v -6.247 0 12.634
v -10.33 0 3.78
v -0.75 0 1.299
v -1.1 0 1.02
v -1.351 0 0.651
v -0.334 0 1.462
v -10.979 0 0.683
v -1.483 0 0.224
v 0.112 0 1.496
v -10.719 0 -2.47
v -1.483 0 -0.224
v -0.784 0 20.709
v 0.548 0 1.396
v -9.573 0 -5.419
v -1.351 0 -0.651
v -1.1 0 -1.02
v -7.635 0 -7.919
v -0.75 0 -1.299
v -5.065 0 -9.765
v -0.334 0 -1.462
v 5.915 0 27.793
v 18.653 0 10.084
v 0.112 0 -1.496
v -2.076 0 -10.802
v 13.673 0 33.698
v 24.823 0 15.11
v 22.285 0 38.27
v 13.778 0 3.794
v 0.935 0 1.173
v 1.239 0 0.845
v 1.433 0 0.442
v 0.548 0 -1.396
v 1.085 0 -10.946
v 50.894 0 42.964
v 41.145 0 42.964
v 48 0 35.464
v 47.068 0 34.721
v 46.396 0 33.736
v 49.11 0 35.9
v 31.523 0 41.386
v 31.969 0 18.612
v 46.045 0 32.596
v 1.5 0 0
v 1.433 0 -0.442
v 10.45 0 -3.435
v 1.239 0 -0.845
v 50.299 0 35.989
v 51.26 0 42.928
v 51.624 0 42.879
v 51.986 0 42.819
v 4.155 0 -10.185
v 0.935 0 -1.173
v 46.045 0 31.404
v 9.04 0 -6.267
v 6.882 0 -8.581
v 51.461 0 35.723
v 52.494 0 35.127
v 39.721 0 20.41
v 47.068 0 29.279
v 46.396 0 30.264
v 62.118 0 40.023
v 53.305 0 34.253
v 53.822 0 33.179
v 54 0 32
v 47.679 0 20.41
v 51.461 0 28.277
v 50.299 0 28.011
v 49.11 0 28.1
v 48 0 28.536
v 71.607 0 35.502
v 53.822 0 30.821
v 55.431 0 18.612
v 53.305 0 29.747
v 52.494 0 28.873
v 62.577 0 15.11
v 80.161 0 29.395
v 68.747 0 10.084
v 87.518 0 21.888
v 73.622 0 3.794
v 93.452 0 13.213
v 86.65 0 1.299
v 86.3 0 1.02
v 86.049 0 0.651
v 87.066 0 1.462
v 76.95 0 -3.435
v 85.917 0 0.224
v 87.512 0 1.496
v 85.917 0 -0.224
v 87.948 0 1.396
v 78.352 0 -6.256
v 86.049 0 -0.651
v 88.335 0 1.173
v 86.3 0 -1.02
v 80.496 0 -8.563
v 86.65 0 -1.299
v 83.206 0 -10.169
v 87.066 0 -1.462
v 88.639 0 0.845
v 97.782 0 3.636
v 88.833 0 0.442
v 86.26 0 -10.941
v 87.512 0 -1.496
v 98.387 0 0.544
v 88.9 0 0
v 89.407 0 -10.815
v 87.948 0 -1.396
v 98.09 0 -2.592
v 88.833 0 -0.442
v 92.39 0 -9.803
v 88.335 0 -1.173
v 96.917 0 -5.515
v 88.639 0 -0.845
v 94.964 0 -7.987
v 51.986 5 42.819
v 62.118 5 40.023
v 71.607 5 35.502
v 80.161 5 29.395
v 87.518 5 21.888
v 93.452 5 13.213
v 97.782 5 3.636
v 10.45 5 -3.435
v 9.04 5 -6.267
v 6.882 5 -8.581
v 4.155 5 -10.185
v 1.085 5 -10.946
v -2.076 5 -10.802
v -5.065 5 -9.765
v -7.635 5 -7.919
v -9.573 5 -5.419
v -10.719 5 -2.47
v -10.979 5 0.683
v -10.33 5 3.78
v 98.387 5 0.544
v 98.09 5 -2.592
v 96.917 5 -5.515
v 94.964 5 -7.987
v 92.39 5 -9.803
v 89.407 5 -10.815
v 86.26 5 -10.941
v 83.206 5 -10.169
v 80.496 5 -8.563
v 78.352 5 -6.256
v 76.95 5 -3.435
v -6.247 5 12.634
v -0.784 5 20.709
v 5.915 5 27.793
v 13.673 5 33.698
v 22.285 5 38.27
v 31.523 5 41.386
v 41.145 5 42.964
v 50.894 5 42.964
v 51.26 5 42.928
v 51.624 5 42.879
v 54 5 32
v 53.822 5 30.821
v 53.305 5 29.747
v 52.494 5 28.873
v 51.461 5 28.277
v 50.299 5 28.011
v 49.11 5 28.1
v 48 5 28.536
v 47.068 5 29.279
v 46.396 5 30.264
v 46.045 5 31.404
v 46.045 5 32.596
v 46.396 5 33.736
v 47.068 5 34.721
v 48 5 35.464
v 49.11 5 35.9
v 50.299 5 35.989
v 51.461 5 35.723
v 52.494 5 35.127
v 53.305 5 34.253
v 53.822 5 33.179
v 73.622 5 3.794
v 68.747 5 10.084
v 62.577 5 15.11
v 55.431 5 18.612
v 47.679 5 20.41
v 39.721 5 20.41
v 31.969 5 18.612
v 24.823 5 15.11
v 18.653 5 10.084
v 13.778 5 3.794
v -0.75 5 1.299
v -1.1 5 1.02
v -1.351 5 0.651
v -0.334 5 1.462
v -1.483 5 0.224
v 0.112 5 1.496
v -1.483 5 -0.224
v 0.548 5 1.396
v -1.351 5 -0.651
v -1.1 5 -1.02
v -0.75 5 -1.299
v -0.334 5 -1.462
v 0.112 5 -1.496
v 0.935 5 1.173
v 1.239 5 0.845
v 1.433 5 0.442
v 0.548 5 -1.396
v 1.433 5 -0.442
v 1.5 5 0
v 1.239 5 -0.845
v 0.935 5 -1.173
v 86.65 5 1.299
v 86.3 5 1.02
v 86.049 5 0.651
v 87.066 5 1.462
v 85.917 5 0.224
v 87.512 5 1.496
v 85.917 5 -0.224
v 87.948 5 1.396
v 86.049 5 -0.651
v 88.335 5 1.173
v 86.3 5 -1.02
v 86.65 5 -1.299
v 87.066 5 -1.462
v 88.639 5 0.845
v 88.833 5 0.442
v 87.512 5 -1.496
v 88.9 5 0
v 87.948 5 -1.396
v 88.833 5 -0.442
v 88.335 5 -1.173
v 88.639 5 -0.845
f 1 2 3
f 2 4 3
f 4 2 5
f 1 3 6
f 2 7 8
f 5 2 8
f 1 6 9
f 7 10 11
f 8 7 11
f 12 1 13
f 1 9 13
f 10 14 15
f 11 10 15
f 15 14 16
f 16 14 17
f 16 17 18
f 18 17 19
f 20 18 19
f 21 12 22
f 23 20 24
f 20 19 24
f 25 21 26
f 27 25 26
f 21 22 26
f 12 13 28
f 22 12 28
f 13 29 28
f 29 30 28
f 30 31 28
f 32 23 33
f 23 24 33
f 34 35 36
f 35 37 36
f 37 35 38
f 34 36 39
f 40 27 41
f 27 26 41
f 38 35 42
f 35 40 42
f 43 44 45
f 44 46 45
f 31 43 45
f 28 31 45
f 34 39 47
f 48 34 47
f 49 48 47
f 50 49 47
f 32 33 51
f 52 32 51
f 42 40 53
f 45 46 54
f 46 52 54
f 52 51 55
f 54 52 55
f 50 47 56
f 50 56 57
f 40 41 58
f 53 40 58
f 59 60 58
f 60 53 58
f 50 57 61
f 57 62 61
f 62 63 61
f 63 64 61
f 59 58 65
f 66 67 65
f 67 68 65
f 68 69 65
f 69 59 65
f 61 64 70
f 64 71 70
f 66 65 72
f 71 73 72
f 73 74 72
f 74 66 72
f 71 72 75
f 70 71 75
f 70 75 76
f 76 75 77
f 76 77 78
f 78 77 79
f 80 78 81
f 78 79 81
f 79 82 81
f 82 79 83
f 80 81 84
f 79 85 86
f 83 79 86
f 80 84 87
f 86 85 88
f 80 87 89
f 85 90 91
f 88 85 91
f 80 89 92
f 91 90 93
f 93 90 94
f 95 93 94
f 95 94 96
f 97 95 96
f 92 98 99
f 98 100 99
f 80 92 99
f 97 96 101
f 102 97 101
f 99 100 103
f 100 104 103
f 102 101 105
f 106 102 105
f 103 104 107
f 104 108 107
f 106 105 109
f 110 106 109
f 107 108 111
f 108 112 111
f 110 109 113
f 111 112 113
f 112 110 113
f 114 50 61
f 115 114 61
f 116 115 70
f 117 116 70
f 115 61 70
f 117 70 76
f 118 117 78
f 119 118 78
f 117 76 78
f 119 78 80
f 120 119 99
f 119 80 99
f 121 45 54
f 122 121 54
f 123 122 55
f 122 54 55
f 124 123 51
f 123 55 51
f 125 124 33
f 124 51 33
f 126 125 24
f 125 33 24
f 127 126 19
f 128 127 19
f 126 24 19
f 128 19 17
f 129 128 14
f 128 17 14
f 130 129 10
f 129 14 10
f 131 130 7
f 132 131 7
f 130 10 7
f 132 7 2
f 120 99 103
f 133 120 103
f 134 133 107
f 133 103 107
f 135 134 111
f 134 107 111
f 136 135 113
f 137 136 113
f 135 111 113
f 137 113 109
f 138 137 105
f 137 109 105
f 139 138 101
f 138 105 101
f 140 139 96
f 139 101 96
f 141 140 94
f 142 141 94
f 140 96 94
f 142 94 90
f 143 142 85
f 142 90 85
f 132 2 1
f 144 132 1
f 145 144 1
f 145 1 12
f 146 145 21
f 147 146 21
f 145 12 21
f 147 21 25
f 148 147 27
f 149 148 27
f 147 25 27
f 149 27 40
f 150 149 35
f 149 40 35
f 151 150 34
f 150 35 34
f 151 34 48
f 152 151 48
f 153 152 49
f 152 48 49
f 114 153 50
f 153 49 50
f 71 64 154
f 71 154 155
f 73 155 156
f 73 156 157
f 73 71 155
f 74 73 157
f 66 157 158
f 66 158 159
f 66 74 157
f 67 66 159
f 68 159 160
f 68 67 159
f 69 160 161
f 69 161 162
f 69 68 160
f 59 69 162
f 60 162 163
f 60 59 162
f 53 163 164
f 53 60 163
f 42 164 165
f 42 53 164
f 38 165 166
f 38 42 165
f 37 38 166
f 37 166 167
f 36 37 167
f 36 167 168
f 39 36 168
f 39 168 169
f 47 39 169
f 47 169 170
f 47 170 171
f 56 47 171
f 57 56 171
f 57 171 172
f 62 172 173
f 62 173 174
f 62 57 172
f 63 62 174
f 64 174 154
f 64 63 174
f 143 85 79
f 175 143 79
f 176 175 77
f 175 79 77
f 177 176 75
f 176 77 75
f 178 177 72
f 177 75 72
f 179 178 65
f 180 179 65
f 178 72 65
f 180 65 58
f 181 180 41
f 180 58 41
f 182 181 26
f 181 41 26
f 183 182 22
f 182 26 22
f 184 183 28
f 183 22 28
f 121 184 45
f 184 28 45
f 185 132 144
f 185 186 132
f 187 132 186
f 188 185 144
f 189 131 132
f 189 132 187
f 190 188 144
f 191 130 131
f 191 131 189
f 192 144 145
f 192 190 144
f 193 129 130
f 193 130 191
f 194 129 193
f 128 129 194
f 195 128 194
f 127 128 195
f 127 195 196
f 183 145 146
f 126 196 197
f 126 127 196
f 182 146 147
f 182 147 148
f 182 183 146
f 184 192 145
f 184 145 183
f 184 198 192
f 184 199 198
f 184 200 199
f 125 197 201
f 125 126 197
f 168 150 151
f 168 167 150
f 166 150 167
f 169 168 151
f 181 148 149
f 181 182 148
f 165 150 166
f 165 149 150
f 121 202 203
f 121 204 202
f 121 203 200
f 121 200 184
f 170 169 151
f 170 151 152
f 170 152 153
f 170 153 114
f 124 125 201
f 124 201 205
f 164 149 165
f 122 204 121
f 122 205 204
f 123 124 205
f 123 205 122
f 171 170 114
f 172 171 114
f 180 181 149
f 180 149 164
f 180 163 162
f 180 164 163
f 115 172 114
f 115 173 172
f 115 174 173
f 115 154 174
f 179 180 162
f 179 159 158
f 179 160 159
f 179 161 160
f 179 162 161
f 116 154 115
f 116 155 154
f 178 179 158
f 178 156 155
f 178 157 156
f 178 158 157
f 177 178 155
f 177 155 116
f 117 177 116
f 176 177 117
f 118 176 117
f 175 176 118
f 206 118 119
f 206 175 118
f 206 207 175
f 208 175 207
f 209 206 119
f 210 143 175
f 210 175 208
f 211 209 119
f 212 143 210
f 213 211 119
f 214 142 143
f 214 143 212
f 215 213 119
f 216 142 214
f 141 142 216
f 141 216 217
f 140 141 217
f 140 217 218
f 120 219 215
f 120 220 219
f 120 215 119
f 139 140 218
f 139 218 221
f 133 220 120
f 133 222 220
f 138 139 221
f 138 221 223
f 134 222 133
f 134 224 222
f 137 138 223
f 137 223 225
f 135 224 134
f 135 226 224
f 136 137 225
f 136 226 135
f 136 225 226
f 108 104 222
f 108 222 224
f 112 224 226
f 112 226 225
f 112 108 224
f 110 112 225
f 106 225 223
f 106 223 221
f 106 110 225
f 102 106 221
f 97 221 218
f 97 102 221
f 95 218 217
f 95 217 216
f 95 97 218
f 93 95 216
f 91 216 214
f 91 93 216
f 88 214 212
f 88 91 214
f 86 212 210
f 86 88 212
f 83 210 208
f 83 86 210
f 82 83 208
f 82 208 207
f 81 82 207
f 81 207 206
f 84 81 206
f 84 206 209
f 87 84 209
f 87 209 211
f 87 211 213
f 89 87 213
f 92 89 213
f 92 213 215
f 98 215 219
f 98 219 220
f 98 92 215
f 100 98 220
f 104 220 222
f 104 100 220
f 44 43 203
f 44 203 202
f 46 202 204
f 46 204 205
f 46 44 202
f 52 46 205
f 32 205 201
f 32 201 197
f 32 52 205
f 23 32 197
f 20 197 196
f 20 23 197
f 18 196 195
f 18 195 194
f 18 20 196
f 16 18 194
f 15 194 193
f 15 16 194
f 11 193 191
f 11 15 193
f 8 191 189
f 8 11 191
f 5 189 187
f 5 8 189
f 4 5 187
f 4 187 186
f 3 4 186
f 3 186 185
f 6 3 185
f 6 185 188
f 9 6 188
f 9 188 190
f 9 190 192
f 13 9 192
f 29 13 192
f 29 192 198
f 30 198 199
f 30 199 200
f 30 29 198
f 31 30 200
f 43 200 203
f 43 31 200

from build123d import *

# Parameters (mm, degrees)
SKETCH2_R           = 4
SKETCH2_R_2         = 1.5
BOSS_EXTRUDE1_DEPTH = 5


with BuildPart() as part:
    # Sketch2 → Boss-Extrude1 (new body)
    with BuildSketch(Plane(origin=(0, 0, 0), x_dir=(1, 0, 0), z_dir=(0, 1, 0))):
        with BuildLine():
            ThreePointArc((76.95, 3.434748899), (43.7, -20.636504604), (10.45, 3.434748899))
            ThreePointArc((10.45, 3.434748899), (-3.607827445, 10.391514862), (-10.330163324, -3.779910806))
            ThreePointArc((-10.330163324, -3.779910806), (13.672960294, -33.698499541), (50.894326472, -42.963584275))
            ThreePointArc((50.894326472, -42.963584275), (51.441931195, -42.905082963), (51.985921637, -42.819247444))
            ThreePointArc((51.985921637, -42.819247444), (80.160934451, -29.394967139), (97.781840004, -3.635573974))
            ThreePointArc((97.781840004, -3.635573974), (90.935325704, 10.416403994), (76.95, 3.434748899))
        make_face()
        with Locations((50, -32)):
            Circle(SKETCH2_R, mode=Mode.SUBTRACT)
        Circle(SKETCH2_R_2, mode=Mode.SUBTRACT)
        with Locations((87.4, 0)):
            Circle(SKETCH2_R_2, mode=Mode.SUBTRACT)
    extrude(amount=BOSS_EXTRUDE1_DEPTH)


solid = part.part
